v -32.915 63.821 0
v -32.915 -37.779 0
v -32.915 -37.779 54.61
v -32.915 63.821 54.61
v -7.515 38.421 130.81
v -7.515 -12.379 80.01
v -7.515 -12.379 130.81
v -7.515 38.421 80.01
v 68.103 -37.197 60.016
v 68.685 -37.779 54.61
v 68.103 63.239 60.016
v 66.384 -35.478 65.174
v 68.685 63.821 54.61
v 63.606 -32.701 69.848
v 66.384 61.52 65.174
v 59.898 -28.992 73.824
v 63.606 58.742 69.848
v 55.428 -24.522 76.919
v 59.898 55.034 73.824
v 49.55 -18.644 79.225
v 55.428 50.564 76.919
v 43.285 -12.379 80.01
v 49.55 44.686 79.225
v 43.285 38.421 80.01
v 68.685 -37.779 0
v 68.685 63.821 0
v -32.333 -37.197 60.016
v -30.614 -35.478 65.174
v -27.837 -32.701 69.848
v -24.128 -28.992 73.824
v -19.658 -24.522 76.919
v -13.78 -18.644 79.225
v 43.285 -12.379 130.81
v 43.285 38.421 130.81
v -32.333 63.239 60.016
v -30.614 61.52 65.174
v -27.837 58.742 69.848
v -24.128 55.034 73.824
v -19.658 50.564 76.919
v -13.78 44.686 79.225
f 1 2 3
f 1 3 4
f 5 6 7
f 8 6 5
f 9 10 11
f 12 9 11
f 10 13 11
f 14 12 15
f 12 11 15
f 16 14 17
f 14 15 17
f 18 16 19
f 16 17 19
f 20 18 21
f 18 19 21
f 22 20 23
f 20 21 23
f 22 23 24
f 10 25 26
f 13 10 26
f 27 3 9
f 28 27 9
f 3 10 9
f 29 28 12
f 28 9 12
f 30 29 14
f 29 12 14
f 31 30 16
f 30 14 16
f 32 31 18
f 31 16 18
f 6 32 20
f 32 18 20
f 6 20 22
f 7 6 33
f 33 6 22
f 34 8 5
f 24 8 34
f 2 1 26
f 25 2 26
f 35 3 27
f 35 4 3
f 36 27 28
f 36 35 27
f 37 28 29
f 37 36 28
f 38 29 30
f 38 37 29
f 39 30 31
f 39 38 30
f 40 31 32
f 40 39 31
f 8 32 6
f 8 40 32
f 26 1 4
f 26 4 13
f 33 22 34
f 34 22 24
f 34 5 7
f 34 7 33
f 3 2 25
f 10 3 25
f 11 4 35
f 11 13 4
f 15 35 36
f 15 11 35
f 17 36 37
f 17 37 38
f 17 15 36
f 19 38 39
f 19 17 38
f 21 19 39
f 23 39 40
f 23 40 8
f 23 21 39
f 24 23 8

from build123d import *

# Parameters (mm, degrees)
F0_W      = 101.6
F0_H      = 101.6
F1_DEPTH  = 80.01
F2_R      = 25.4
F1_FACE_W = 50.8
F1_FACE_H = 50.8
F3_DEPTH  = 50.8


with BuildPart() as f1:
    # F0 (on Top) → F1 (new body)
    with BuildSketch(Plane.XY):
        with Locations((17.88482, 13.020775)):
            Rectangle(F0_W, F0_H)
    extrude(amount=F1_DEPTH)

    # F2
    f2_edges = [f1.edges().sort_by_distance(p)[0] for p in [
        (17.88482, -37.779225, 80.01),
        (-32.91518, 13.020775, 80.01),
        (17.88482, 63.820775, 80.01),
        (68.68482, 13.020775, 80.01),
    ]]
    fillet(f2_edges, radius=F2_R)

    # F1_face (on face) → F3 (join)
    with BuildSketch(Plane(origin=(17.88482, 13.020775, 80.01), x_dir=(1, 0, 0), z_dir=(0, 0, 1))):
        Rectangle(F1_FACE_W, F1_FACE_H)
    extrude(amount=F3_DEPTH)


solid = f1.part
